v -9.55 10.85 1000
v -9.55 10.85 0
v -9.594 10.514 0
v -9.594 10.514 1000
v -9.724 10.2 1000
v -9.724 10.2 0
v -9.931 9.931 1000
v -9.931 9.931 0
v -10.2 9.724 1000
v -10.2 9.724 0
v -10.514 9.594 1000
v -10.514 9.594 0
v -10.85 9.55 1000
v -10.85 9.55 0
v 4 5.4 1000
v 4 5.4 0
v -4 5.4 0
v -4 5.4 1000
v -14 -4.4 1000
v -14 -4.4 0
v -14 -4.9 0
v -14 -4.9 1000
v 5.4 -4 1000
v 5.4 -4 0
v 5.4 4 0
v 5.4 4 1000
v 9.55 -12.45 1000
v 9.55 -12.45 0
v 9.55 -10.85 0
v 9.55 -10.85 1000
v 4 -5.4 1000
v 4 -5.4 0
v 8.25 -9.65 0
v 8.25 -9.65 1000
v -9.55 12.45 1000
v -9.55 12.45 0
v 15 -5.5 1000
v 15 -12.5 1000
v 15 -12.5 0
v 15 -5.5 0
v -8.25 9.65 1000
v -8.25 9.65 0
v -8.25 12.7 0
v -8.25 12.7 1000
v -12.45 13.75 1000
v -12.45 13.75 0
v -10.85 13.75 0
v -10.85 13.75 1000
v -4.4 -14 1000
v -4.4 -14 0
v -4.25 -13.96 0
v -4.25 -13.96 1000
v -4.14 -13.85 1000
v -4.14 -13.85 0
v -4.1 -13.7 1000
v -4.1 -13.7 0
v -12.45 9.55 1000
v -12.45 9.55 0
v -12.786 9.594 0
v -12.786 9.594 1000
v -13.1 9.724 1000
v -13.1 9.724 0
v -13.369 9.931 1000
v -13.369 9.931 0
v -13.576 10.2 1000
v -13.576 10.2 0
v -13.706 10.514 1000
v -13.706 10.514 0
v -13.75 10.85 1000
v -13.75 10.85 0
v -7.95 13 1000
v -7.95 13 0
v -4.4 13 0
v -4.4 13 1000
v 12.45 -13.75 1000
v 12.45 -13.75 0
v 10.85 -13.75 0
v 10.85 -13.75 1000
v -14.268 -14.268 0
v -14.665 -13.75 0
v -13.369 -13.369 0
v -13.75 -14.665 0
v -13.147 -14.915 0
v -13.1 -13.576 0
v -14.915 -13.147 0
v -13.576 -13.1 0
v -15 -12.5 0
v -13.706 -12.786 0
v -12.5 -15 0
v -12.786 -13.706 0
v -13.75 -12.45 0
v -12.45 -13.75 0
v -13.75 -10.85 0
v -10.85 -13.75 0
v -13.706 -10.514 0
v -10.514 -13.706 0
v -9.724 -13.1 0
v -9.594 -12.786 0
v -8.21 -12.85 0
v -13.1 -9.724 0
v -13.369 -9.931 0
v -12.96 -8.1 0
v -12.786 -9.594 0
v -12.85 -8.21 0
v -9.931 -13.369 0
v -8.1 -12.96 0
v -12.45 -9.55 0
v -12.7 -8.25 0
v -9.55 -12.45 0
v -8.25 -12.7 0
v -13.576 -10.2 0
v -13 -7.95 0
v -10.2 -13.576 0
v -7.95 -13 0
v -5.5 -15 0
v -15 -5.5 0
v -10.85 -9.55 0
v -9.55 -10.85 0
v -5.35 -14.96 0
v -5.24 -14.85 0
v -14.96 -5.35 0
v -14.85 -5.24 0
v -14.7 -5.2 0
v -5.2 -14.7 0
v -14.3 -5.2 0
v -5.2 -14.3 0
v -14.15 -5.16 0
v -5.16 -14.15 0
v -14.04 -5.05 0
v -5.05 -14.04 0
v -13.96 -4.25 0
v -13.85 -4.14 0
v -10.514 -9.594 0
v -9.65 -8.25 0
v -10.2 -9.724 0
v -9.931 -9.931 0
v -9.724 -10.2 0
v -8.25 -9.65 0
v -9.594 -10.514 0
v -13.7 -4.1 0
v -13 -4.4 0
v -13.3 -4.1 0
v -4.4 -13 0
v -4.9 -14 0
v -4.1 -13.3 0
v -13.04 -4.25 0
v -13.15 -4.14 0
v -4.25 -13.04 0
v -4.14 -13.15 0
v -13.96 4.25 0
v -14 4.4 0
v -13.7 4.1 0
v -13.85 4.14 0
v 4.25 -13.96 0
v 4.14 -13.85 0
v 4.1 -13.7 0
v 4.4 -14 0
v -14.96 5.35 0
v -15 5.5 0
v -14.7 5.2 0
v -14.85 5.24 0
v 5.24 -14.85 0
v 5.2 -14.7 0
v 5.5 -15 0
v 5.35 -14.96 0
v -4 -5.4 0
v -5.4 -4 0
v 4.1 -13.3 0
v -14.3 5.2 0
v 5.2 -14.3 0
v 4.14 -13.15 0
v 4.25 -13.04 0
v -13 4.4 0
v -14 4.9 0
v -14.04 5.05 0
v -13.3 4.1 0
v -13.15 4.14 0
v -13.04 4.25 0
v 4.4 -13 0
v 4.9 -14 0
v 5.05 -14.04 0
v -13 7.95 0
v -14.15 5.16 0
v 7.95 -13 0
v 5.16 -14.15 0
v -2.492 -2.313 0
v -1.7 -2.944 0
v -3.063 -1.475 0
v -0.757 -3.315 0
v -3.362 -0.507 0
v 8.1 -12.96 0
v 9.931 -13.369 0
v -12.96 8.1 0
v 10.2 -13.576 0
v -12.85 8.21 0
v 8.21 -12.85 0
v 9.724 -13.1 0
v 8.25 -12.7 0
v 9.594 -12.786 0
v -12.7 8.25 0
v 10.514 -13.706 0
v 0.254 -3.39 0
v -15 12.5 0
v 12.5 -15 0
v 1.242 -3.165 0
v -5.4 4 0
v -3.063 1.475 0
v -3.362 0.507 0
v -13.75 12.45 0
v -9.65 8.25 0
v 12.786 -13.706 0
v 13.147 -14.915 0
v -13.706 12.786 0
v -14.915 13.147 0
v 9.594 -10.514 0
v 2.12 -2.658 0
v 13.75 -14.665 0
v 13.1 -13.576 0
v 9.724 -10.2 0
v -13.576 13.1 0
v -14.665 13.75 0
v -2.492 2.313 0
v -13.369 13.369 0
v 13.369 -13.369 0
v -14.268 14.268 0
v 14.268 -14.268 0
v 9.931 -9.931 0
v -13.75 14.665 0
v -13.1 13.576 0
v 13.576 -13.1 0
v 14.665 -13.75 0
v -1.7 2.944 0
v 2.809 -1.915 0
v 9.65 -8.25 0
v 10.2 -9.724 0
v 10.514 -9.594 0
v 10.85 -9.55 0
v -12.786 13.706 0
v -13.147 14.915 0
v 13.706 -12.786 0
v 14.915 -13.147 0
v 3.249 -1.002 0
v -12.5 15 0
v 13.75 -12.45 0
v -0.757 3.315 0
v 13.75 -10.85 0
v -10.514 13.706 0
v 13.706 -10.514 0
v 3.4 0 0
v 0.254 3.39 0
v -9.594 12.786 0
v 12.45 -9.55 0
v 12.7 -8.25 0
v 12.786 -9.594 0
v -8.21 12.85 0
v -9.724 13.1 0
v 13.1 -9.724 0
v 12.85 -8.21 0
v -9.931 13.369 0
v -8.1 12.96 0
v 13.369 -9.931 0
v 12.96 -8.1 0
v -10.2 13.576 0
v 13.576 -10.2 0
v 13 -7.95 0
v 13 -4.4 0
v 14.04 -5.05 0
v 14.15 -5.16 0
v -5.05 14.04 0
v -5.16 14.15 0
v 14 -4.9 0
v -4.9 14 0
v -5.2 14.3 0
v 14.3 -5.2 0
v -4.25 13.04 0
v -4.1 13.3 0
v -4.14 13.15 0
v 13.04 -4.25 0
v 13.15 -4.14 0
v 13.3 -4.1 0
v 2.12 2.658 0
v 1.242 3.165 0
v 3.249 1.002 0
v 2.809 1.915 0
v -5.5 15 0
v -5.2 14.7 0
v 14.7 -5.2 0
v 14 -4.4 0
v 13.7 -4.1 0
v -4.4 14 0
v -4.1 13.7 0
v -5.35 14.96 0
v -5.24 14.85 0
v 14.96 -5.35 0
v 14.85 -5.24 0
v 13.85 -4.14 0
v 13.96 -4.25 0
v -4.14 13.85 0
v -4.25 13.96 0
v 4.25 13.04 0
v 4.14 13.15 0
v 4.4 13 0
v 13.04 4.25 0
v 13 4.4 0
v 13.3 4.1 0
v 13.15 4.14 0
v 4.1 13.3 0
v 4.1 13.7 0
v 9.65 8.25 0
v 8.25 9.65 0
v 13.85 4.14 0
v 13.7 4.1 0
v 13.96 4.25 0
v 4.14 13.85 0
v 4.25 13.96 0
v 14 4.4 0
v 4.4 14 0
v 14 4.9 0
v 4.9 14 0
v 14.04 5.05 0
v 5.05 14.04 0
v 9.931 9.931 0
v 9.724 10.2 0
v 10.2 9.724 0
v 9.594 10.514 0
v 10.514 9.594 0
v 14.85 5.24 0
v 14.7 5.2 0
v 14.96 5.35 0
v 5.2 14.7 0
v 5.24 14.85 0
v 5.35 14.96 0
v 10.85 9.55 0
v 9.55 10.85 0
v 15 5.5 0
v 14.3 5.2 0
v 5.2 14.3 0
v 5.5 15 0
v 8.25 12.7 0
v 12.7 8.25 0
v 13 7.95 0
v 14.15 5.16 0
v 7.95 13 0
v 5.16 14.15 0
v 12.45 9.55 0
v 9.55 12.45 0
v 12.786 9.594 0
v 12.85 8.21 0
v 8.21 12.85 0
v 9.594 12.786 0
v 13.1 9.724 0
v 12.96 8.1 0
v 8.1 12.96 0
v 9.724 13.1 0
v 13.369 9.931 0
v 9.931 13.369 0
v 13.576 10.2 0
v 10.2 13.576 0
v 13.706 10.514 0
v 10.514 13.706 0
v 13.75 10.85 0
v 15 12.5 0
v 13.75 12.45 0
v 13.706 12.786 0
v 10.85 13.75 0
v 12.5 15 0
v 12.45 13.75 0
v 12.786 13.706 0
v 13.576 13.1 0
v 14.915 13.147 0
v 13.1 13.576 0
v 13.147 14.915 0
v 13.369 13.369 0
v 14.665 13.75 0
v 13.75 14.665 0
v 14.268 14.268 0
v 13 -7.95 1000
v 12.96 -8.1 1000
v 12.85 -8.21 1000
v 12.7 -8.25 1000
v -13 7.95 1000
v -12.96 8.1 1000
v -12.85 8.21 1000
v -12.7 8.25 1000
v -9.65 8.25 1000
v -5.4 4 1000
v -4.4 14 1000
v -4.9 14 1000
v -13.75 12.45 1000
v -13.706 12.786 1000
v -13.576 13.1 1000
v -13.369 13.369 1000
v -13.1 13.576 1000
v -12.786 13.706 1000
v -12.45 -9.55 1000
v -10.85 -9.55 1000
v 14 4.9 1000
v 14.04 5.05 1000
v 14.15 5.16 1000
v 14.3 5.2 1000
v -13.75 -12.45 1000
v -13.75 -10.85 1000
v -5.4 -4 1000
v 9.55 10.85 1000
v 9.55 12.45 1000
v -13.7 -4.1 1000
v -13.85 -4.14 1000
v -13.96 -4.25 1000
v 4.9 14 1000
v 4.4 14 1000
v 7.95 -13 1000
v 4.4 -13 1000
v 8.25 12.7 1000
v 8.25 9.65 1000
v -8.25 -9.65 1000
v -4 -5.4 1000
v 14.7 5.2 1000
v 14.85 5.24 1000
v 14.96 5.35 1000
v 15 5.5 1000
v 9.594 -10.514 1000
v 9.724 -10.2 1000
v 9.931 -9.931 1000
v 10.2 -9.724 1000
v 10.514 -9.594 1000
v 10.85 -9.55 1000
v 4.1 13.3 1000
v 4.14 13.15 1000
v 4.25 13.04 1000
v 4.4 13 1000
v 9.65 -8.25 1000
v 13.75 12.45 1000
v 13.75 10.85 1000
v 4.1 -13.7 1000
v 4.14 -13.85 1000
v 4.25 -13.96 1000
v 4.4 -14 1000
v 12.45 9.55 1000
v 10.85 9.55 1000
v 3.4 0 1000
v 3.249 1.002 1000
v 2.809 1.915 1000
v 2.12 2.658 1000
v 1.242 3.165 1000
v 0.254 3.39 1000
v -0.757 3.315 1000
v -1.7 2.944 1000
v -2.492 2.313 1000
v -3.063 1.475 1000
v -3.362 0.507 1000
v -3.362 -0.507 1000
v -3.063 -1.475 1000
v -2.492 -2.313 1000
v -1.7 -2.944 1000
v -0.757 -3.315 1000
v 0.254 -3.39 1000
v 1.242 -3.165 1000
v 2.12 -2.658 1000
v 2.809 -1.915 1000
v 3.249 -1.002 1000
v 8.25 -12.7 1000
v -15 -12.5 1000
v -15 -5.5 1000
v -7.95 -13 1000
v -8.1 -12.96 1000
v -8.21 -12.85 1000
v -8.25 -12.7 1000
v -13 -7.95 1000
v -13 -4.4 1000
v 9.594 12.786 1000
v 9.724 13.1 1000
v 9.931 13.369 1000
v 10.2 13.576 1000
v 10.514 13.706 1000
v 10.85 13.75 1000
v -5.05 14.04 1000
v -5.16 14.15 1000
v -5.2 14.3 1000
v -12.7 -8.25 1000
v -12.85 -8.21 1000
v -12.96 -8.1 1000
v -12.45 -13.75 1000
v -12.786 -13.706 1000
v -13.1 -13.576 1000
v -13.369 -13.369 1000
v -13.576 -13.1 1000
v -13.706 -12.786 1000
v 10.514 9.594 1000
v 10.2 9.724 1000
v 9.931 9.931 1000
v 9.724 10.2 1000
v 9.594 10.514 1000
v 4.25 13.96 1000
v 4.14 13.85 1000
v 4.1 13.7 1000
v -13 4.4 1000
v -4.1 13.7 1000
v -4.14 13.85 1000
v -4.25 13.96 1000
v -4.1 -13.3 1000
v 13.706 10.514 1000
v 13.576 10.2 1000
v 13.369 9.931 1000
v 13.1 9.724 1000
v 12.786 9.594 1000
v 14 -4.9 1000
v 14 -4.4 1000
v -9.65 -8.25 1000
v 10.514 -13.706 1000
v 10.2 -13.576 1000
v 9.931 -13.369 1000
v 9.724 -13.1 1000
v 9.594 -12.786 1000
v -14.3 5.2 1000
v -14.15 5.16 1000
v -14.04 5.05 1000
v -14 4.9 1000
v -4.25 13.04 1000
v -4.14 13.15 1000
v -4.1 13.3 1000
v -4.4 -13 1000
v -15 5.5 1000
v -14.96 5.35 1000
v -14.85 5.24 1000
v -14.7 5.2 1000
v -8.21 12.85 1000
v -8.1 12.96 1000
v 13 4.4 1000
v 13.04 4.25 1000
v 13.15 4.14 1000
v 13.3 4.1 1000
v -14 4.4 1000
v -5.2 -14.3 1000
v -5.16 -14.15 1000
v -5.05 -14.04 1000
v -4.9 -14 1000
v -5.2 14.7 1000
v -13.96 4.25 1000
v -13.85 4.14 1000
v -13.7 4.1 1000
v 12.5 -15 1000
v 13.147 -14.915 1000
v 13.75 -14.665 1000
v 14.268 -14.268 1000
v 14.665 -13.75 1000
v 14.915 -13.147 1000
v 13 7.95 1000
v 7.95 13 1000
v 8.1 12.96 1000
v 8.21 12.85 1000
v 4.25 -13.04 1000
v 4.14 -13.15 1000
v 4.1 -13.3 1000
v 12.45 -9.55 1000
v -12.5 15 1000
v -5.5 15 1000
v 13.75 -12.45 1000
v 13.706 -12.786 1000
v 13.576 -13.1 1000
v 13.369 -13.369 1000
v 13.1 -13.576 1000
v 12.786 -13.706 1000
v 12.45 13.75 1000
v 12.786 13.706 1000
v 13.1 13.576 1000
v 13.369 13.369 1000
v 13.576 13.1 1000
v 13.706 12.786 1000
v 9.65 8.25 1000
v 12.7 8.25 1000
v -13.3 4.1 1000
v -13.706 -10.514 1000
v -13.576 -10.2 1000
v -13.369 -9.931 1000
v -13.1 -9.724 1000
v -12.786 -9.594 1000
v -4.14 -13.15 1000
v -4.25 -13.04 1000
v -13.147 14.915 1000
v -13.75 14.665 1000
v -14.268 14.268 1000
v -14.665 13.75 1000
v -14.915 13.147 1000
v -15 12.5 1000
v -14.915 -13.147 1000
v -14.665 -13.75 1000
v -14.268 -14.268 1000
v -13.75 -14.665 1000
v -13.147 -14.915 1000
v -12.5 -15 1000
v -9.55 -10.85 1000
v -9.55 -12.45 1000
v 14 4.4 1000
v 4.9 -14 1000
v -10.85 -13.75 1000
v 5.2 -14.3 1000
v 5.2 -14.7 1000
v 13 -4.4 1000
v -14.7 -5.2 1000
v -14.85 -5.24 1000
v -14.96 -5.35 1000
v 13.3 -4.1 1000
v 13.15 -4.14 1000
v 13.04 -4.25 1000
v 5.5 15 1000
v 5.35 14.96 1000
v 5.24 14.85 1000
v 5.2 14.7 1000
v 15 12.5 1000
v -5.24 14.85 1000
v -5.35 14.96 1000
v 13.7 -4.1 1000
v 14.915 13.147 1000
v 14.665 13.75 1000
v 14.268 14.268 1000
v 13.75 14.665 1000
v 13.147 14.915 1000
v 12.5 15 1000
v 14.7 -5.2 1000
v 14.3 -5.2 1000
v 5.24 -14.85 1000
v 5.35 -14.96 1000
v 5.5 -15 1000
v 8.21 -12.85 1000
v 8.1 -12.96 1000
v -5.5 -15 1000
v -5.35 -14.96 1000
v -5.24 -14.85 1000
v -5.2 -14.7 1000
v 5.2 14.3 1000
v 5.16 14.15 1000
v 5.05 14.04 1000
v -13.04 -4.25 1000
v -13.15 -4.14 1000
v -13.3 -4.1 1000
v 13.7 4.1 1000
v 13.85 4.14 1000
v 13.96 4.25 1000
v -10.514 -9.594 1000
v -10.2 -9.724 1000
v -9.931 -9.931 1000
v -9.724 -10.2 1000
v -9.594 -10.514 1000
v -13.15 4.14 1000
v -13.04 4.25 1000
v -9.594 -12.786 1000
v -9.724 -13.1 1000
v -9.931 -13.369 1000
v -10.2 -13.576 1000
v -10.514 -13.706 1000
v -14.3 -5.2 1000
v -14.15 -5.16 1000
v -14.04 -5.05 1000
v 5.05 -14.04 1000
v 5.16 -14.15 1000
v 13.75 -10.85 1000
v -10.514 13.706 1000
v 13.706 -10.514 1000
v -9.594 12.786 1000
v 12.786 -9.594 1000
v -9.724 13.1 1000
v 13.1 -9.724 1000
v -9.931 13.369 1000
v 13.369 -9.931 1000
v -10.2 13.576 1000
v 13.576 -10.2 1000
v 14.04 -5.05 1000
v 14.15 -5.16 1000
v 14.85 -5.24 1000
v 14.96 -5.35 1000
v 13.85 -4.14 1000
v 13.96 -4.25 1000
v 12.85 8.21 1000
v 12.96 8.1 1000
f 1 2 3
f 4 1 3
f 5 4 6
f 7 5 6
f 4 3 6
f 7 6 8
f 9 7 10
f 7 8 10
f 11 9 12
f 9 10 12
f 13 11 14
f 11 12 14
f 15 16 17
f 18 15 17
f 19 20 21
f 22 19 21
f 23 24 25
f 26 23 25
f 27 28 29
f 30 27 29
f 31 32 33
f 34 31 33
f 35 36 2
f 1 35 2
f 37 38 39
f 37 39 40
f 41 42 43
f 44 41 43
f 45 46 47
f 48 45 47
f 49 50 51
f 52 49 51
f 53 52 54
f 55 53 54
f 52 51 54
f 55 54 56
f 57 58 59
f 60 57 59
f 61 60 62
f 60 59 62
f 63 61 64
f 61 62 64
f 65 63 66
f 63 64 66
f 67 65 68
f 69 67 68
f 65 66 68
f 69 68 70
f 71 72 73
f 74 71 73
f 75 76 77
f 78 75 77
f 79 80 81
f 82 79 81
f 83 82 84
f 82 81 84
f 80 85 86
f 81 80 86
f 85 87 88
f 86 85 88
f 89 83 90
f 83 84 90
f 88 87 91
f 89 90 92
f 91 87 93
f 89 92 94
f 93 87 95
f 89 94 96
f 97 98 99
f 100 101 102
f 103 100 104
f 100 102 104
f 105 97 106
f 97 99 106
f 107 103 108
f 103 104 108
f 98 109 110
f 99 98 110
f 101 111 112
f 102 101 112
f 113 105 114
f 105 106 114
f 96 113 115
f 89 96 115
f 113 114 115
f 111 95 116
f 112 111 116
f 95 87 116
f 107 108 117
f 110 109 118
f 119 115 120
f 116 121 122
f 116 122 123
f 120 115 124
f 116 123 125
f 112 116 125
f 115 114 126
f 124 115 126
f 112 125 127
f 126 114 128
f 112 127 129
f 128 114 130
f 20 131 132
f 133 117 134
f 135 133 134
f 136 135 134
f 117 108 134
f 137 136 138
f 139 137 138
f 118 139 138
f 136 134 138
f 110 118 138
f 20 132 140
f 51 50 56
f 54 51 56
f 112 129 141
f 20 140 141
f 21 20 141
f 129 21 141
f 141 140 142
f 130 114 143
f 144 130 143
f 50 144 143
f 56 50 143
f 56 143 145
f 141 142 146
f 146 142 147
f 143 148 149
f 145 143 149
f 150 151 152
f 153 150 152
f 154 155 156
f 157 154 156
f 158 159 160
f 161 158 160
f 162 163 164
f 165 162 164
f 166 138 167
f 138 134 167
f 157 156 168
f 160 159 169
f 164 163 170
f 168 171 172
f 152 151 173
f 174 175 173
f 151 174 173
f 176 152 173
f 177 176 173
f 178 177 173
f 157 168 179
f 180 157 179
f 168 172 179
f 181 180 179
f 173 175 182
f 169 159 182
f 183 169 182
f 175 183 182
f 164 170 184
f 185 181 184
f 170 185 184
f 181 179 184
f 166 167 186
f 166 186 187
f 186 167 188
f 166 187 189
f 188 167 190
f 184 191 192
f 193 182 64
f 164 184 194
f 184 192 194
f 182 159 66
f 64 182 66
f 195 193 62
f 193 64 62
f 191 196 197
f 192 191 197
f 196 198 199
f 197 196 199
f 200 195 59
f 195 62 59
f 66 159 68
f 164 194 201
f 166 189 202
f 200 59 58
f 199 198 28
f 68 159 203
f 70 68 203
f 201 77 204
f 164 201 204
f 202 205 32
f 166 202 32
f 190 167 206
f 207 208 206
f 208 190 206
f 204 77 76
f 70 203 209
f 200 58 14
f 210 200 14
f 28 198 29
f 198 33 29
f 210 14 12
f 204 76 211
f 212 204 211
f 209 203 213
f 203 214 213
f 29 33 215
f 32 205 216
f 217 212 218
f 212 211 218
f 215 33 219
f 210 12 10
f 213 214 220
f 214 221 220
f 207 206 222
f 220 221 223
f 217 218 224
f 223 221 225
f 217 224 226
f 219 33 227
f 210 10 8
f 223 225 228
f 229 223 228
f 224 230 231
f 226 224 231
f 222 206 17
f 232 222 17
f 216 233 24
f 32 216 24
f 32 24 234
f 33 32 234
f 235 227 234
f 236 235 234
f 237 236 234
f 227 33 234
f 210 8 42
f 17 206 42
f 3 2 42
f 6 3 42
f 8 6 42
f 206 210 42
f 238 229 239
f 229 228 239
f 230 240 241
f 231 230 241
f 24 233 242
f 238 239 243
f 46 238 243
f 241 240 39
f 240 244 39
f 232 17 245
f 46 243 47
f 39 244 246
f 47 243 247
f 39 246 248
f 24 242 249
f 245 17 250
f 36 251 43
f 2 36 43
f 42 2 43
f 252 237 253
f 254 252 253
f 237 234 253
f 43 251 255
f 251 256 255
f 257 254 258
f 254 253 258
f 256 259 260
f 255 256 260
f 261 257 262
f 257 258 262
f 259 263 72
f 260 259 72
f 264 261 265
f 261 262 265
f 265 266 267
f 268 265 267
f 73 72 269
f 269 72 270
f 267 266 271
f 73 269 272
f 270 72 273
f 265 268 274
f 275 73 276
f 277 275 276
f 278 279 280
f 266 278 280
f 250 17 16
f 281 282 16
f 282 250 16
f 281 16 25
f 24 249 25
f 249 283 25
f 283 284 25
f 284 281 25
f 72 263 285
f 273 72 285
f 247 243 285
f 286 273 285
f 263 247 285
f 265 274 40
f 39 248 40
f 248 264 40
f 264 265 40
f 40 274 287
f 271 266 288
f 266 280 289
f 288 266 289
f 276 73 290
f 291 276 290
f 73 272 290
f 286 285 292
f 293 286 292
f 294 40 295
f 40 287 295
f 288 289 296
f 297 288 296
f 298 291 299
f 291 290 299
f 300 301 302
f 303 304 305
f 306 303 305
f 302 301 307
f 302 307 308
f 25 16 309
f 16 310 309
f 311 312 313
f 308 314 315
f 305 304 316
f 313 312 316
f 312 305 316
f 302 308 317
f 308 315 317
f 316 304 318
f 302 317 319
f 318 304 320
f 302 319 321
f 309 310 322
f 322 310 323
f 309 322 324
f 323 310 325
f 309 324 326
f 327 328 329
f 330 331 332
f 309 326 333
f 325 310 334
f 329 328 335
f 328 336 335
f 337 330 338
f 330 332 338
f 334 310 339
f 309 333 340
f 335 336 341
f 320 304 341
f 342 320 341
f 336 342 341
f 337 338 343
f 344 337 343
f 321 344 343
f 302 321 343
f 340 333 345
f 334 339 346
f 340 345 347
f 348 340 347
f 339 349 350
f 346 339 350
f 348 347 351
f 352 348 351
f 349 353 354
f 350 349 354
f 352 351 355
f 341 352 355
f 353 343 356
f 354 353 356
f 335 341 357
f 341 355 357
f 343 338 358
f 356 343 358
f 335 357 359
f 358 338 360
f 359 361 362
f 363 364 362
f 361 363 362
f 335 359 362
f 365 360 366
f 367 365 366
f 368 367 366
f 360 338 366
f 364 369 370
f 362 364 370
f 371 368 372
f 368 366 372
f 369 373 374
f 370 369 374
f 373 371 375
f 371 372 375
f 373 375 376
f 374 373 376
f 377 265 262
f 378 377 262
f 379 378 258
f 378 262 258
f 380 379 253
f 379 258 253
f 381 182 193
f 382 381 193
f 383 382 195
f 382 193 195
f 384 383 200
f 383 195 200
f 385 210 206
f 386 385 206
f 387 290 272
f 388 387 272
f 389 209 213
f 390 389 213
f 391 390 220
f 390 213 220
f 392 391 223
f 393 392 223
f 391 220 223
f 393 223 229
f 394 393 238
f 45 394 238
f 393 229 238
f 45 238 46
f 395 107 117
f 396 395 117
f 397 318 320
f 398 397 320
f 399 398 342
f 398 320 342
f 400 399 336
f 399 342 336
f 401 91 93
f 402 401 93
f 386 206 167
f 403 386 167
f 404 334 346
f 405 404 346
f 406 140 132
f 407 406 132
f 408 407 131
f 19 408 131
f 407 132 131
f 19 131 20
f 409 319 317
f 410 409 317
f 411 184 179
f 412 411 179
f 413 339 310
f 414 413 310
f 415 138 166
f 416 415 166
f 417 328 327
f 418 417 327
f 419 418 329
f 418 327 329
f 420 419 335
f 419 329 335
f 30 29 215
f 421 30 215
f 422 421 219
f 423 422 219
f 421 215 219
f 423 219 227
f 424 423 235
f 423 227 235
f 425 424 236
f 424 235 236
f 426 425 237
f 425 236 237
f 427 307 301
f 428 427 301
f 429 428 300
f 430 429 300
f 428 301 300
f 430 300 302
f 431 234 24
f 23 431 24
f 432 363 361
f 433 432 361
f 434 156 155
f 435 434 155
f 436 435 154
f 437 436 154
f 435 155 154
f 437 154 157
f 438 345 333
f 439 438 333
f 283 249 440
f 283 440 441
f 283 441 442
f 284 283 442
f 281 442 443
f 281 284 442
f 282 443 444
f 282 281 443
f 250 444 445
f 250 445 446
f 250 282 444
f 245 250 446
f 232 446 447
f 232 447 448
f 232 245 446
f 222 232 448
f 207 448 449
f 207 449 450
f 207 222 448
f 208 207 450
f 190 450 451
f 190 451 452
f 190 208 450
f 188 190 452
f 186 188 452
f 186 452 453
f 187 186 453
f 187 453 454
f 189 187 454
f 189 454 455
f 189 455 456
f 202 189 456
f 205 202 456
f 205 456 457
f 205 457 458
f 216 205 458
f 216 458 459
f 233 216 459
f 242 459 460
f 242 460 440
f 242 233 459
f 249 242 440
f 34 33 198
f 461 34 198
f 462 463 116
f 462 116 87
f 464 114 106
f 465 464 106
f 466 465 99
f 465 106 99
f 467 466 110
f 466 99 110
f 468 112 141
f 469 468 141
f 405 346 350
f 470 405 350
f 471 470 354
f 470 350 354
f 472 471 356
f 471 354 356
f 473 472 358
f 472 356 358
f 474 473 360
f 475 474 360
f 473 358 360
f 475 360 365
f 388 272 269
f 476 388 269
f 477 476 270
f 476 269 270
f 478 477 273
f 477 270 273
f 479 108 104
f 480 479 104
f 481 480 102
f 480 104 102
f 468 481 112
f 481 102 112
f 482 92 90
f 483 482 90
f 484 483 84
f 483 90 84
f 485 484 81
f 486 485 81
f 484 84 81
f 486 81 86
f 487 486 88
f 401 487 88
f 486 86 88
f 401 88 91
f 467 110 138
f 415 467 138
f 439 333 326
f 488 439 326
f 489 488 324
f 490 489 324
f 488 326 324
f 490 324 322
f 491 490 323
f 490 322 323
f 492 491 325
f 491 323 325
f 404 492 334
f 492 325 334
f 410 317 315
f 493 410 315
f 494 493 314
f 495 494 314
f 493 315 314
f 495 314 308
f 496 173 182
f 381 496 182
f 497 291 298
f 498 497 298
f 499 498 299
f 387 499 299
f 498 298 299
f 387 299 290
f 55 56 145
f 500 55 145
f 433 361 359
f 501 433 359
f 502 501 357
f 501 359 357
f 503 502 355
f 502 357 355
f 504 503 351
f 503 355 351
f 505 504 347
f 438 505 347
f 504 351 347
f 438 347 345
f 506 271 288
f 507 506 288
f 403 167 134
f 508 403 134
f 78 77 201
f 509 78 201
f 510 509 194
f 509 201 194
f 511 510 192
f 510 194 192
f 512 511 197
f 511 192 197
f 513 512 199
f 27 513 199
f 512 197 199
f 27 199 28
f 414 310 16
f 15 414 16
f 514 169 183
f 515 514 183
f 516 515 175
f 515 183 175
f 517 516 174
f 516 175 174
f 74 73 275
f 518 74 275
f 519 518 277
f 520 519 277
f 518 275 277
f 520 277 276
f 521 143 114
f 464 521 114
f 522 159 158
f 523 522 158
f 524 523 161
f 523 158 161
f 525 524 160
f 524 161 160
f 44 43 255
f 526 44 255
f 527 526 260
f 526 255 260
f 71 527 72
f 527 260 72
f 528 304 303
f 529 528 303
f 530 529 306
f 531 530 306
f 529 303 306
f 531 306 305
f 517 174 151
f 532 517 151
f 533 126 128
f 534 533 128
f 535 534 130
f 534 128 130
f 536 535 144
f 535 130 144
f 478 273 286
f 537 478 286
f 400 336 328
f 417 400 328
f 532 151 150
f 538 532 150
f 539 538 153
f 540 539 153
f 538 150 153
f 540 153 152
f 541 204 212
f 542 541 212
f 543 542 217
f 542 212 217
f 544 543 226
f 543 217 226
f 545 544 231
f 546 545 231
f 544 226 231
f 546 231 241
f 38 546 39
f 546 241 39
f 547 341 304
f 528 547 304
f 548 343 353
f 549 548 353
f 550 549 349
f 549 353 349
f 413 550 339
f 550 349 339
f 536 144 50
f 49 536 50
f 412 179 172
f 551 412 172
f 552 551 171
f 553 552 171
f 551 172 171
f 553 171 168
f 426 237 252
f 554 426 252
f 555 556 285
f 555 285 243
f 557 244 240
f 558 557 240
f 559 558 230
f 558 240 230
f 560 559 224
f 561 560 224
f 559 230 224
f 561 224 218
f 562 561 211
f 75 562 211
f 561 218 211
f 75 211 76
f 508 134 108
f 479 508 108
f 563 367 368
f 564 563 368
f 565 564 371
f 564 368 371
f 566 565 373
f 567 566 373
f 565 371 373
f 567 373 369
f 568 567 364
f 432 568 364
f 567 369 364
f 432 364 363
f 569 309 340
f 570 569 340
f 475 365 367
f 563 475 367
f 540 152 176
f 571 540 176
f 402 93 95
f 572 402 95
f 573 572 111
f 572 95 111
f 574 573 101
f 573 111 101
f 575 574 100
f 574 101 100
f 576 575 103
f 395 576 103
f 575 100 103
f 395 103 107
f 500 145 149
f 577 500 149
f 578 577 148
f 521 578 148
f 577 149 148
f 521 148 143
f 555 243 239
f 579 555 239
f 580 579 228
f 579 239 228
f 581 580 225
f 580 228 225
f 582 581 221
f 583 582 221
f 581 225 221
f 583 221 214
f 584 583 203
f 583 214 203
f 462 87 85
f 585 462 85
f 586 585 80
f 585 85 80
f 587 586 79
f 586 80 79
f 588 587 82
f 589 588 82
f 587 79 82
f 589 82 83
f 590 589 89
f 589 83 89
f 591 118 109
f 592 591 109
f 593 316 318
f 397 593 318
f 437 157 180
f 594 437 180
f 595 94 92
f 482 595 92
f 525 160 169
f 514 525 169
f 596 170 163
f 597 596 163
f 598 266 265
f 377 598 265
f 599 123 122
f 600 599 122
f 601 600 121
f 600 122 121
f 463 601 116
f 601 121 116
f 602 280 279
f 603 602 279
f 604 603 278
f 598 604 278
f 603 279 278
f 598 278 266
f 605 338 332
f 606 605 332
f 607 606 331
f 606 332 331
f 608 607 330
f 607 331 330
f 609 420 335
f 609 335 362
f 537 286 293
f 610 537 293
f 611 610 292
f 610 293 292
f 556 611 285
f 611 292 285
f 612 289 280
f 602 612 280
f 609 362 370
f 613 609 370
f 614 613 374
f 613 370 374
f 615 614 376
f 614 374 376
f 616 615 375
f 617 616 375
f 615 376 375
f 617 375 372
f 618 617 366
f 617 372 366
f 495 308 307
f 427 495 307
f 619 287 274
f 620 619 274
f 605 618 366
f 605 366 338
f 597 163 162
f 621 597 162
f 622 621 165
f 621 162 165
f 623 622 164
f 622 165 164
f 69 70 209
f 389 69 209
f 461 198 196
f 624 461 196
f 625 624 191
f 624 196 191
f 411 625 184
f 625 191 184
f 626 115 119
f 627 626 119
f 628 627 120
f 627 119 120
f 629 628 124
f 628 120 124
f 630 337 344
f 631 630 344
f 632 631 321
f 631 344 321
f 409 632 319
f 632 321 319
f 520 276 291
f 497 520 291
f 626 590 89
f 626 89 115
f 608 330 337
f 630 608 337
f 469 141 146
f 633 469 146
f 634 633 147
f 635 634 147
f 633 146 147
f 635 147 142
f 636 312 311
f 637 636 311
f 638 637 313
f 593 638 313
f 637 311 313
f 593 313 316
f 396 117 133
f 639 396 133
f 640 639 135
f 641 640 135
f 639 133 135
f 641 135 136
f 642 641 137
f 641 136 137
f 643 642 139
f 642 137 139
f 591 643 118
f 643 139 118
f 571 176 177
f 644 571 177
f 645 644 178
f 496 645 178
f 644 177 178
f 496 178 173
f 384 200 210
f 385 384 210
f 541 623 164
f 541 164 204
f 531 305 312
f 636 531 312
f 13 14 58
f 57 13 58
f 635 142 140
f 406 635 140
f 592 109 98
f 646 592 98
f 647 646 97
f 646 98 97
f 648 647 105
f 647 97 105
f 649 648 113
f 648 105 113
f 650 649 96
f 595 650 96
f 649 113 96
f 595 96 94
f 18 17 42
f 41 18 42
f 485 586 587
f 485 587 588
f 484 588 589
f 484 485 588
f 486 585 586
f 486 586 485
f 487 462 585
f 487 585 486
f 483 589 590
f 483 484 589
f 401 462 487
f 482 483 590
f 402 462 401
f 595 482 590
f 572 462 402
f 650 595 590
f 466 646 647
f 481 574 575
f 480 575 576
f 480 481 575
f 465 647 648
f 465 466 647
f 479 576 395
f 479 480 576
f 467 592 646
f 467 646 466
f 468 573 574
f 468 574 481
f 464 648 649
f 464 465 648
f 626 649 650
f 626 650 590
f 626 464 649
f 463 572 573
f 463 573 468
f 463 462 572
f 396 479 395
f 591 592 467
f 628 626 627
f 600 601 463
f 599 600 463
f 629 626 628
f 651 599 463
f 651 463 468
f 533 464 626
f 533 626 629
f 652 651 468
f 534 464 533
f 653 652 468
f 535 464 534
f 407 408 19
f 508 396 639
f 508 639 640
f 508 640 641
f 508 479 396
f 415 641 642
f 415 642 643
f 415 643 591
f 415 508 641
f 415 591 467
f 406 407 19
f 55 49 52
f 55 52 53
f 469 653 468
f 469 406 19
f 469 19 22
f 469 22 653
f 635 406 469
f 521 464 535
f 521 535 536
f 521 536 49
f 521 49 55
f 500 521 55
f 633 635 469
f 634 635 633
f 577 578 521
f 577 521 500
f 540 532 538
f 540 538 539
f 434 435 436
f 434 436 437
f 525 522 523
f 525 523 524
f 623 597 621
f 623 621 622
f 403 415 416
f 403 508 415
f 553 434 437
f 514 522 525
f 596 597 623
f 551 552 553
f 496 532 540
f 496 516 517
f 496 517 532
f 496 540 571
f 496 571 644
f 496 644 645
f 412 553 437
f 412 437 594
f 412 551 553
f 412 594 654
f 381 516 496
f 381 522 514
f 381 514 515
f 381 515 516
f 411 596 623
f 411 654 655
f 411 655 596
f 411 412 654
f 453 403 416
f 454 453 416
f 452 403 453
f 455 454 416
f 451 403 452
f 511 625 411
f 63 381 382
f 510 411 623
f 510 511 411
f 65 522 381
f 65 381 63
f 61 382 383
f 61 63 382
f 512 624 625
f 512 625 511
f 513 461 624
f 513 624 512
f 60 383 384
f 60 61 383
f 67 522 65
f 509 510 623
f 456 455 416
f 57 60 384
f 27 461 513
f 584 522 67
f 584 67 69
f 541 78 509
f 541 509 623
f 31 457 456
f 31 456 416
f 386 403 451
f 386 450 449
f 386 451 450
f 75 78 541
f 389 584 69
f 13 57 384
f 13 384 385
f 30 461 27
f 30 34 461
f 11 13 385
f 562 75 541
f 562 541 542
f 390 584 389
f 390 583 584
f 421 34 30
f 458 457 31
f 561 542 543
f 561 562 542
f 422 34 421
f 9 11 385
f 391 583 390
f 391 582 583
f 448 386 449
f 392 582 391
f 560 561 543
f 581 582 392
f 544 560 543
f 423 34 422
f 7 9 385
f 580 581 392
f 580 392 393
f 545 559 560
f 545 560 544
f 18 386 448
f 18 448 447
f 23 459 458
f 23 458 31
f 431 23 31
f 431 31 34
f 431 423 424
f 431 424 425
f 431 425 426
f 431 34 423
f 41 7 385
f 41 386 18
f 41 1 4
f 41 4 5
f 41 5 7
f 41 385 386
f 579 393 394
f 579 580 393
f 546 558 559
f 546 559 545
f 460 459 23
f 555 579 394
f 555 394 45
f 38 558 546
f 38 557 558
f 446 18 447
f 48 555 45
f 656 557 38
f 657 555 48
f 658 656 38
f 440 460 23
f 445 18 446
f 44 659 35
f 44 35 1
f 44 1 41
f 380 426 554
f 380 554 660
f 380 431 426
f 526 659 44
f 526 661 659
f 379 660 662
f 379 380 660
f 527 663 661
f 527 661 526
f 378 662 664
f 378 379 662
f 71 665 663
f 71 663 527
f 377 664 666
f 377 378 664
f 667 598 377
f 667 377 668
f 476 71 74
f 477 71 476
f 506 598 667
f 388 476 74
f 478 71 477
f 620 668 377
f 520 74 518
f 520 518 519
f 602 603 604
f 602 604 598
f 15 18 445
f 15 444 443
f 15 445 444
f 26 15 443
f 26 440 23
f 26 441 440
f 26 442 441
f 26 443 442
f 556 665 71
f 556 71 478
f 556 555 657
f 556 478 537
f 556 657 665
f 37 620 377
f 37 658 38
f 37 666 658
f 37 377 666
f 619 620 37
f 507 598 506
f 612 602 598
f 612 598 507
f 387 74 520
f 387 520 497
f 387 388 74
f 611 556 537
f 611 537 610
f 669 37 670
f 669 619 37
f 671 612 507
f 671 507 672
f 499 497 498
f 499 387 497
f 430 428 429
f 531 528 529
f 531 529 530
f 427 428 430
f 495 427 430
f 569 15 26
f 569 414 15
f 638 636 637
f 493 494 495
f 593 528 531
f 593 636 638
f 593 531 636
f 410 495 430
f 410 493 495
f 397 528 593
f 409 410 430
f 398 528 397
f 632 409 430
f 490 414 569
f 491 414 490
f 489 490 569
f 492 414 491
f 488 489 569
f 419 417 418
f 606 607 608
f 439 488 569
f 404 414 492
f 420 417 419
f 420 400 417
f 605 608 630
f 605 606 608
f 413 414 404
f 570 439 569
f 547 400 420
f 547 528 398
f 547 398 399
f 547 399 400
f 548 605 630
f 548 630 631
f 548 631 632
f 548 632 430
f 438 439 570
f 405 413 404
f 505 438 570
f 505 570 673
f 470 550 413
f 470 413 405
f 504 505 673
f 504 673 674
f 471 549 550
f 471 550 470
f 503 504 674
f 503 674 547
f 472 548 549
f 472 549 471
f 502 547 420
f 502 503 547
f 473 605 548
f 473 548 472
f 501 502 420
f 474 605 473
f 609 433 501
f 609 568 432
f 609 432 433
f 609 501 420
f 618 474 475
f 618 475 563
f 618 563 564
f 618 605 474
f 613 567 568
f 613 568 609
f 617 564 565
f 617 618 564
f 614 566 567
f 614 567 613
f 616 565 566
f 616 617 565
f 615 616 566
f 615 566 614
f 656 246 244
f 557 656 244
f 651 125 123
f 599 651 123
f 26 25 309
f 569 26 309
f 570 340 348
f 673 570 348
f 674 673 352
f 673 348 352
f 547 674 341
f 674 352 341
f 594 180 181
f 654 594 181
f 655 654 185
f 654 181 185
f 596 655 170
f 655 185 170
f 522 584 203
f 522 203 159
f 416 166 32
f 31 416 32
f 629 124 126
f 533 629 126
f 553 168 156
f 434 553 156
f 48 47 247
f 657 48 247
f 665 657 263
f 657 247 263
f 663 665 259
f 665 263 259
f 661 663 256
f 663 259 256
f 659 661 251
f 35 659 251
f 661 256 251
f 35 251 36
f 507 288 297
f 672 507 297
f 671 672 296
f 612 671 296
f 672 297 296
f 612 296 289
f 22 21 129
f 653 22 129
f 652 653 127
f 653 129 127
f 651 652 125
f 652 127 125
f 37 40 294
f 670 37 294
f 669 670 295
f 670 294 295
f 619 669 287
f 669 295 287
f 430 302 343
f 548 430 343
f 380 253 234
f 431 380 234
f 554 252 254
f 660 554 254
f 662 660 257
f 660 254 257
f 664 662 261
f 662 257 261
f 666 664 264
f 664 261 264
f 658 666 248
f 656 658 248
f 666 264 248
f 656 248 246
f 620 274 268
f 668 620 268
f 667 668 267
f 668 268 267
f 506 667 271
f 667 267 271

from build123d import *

# Parameters (mm, degrees)
SKETCH_1_R      = 3.4
EXTRUDE_1_DEPTH = 1000


with BuildPart() as part:
    # Эскиз1 → Бобышка-Вытянуть1 (new body)
    with BuildSketch(Plane.XY):
        with BuildLine():
            Line((-15, -8.25), (-15, -12.5))
            ThreePointArc((-15, -12.5), (-14.267766953, -14.267766953), (-12.5, -15))
            Line((-12.5, -15), (-8.25, -15))
            Line((-8.25, -15), (-5.5, -15))
            ThreePointArc((-5.5, -15), (-5.287867966, -14.912132034), (-5.2, -14.7))
            Line((-5.2, -14.7), (-5.2, -14.3))
            ThreePointArc((-5.2, -14.3), (-5.112132034, -14.087867966), (-4.9, -14))
            Line((-4.9, -14), (-4.4, -14))
            ThreePointArc((-4.4, -14), (-4.187867966, -13.912132034), (-4.1, -13.7))
            Line((-4.1, -13.7), (-4.1, -13.3))
            ThreePointArc((-4.1, -13.3), (-4.187867966, -13.087867966), (-4.4, -13))
            Line((-4.4, -13), (-7.95, -13))
            ThreePointArc((-7.95, -13), (-8.162132034, -12.912132034), (-8.25, -12.7))
            Line((-8.25, -12.7), (-8.25, -9.65))
            Line((-8.25, -9.65), (-4, -5.4))
            Line((-4, -5.4), (4, -5.4))
            Line((4, -5.4), (8.25, -9.65))
            Line((8.25, -9.65), (8.25, -12.7))
            ThreePointArc((8.25, -12.7), (8.162132034, -12.912132034), (7.95, -13))
            Line((7.95, -13), (4.4, -13))
            ThreePointArc((4.4, -13), (4.187867966, -13.087867966), (4.1, -13.3))
            Line((4.1, -13.3), (4.1, -13.7))
            ThreePointArc((4.1, -13.7), (4.187867966, -13.912132034), (4.4, -14))
            Line((4.4, -14), (4.9, -14))
            ThreePointArc((4.9, -14), (5.112132034, -14.087867966), (5.2, -14.3))
            Line((5.2, -14.3), (5.2, -14.7))
            ThreePointArc((5.2, -14.7), (5.287867966, -14.912132034), (5.5, -15))
            Line((5.5, -15), (8.25, -15))
            Line((8.25, -15), (12.5, -15))
            ThreePointArc((12.5, -15), (14.267766953, -14.267766953), (15, -12.5))
            Line((15, -12.5), (15, -8.25))
            Line((15, -8.25), (15, -5.5))
            ThreePointArc((15, -5.5), (14.912132034, -5.287867966), (14.7, -5.2))
            Line((14.7, -5.2), (14.3, -5.2))
            ThreePointArc((14.3, -5.2), (14.087867966, -5.112132034), (14, -4.9))
            Line((14, -4.9), (14, -4.4))
            ThreePointArc((14, -4.4), (13.912132034, -4.187867966), (13.7, -4.1))
            Line((13.7, -4.1), (13.3, -4.1))
            ThreePointArc((13.3, -4.1), (13.087867966, -4.187867966), (13, -4.4))
            Line((13, -4.4), (13, -7.95))
            ThreePointArc((13, -7.95), (12.912132034, -8.162132034), (12.7, -8.25))
            Line((12.7, -8.25), (9.65, -8.25))
            Line((9.65, -8.25), (5.4, -4))
            Line((5.4, -4), (5.4, 4))
            Line((5.4, 4), (9.65, 8.25))
            Line((9.65, 8.25), (12.7, 8.25))
            ThreePointArc((12.7, 8.25), (12.912132034, 8.162132034), (13, 7.95))
            Line((13, 7.95), (13, 4.4))
            ThreePointArc((13, 4.4), (13.087867966, 4.187867966), (13.3, 4.1))
            Line((13.3, 4.1), (13.7, 4.1))
            ThreePointArc((13.7, 4.1), (13.912132034, 4.187867966), (14, 4.4))
            Line((14, 4.4), (14, 4.9))
            ThreePointArc((14, 4.9), (14.087867966, 5.112132034), (14.3, 5.2))
            Line((14.3, 5.2), (14.7, 5.2))
            ThreePointArc((14.7, 5.2), (14.912132034, 5.287867966), (15, 5.5))
            Line((15, 5.5), (15, 8.25))
            Line((15, 8.25), (15, 12.5))
            ThreePointArc((15, 12.5), (14.267766953, 14.267766953), (12.5, 15))
            Line((12.5, 15), (8.25, 15))
            Line((8.25, 15), (5.5, 15))
            ThreePointArc((5.5, 15), (5.287867966, 14.912132034), (5.2, 14.7))
            Line((5.2, 14.7), (5.2, 14.3))
            ThreePointArc((5.2, 14.3), (5.112132034, 14.087867966), (4.9, 14))
            Line((4.9, 14), (4.4, 14))
            ThreePointArc((4.4, 14), (4.187867966, 13.912132034), (4.1, 13.7))
            Line((4.1, 13.7), (4.1, 13.3))
            ThreePointArc((4.1, 13.3), (4.187867966, 13.087867966), (4.4, 13))
            Line((4.4, 13), (7.95, 13))
            ThreePointArc((7.95, 13), (8.162132034, 12.912132034), (8.25, 12.7))
            Line((8.25, 12.7), (8.25, 9.65))
            Line((8.25, 9.65), (4, 5.4))
            Line((4, 5.4), (-4, 5.4))
            Line((-4, 5.4), (-8.25, 9.65))
            Line((-8.25, 9.65), (-8.25, 12.7))
            ThreePointArc((-8.25, 12.7), (-8.162132034, 12.912132034), (-7.95, 13))
            Line((-7.95, 13), (-4.4, 13))
            ThreePointArc((-4.4, 13), (-4.187867966, 13.087867966), (-4.1, 13.3))
            Line((-4.1, 13.3), (-4.1, 13.7))
            ThreePointArc((-4.1, 13.7), (-4.187867966, 13.912132034), (-4.4, 14))
            Line((-4.4, 14), (-4.9, 14))
            ThreePointArc((-4.9, 14), (-5.112132034, 14.087867966), (-5.2, 14.3))
            Line((-5.2, 14.3), (-5.2, 14.7))
            ThreePointArc((-5.2, 14.7), (-5.287867966, 14.912132034), (-5.5, 15))
            Line((-5.5, 15), (-8.25, 15))
            Line((-8.25, 15), (-12.5, 15))
            ThreePointArc((-12.5, 15), (-14.267766953, 14.267766953), (-15, 12.5))
            Line((-15, 12.5), (-15, 8.25))
            Line((-15, 8.25), (-15, 5.5))
            ThreePointArc((-15, 5.5), (-14.912132034, 5.287867966), (-14.7, 5.2))
            Line((-14.7, 5.2), (-14.3, 5.2))
            ThreePointArc((-14.3, 5.2), (-14.087867966, 5.112132034), (-14, 4.9))
            Line((-14, 4.9), (-14, 4.4))
            ThreePointArc((-14, 4.4), (-13.912132034, 4.187867966), (-13.7, 4.1))
            Line((-13.7, 4.1), (-13.3, 4.1))
            ThreePointArc((-13.3, 4.1), (-13.087867966, 4.187867966), (-13, 4.4))
            Line((-13, 4.4), (-13, 7.95))
            ThreePointArc((-13, 7.95), (-12.912132034, 8.162132034), (-12.7, 8.25))
            Line((-12.7, 8.25), (-9.65, 8.25))
            Line((-9.65, 8.25), (-5.4, 4))
            Line((-5.4, 4), (-5.4, -4))
            Line((-5.4, -4), (-9.65, -8.25))
            Line((-9.65, -8.25), (-12.7, -8.25))
            ThreePointArc((-12.7, -8.25), (-12.912132034, -8.162132034), (-13, -7.95))
            Line((-13, -7.95), (-13, -4.4))
            ThreePointArc((-13, -4.4), (-13.087867966, -4.187867966), (-13.3, -4.1))
            Line((-13.3, -4.1), (-13.7, -4.1))
            ThreePointArc((-13.7, -4.1), (-13.912132034, -4.187867966), (-14, -4.4))
            Line((-14, -4.4), (-14, -4.9))
            ThreePointArc((-14, -4.9), (-14.087867966, -5.112132034), (-14.3, -5.2))
            Line((-14.3, -5.2), (-14.7, -5.2))
            ThreePointArc((-14.7, -5.2), (-14.912132034, -5.287867966), (-15, -5.5))
            Line((-15, -5.5), (-15, -8.25))
        make_face()
        Circle(SKETCH_1_R, mode=Mode.SUBTRACT)
        with BuildLine():
            Line((-12.45, -9.55), (-10.85, -9.55))
            ThreePointArc((-10.85, -9.55), (-9.930761184, -9.930761184), (-9.55, -10.85))
            Line((-9.55, -10.85), (-9.55, -12.45))
            ThreePointArc((-9.55, -12.45), (-9.930761184, -13.369238816), (-10.85, -13.75))
            Line((-10.85, -13.75), (-12.45, -13.75))
            ThreePointArc((-12.45, -13.75), (-13.369238816, -13.369238816), (-13.75, -12.45))
            Line((-13.75, -12.45), (-13.75, -10.85))
            ThreePointArc((-13.75, -10.85), (-13.369238816, -9.930761184), (-12.45, -9.55))
        make_face(mode=Mode.SUBTRACT)
        with BuildLine():
            Line((-9.55, 12.45), (-9.55, 10.85))
            ThreePointArc((-9.55, 10.85), (-9.930761184, 9.930761184), (-10.85, 9.55))
            Line((-10.85, 9.55), (-12.45, 9.55))
            ThreePointArc((-12.45, 9.55), (-13.369238816, 9.930761184), (-13.75, 10.85))
            Line((-13.75, 10.85), (-13.75, 12.45))
            ThreePointArc((-13.75, 12.45), (-13.369238816, 13.369238816), (-12.45, 13.75))
            Line((-12.45, 13.75), (-10.85, 13.75))
            ThreePointArc((-10.85, 13.75), (-9.930761184, 13.369238816), (-9.55, 12.45))
        make_face(mode=Mode.SUBTRACT)
        with BuildLine():
            Line((12.45, 9.55), (10.85, 9.55))
            ThreePointArc((10.85, 9.55), (9.930761184, 9.930761184), (9.55, 10.85))
            Line((9.55, 10.85), (9.55, 12.45))
            ThreePointArc((9.55, 12.45), (9.930761184, 13.369238816), (10.85, 13.75))
            Line((10.85, 13.75), (12.45, 13.75))
            ThreePointArc((12.45, 13.75), (13.369238816, 13.369238816), (13.75, 12.45))
            Line((13.75, 12.45), (13.75, 10.85))
            ThreePointArc((13.75, 10.85), (13.369238816, 9.930761184), (12.45, 9.55))
        make_face(mode=Mode.SUBTRACT)
        with BuildLine():
            Line((9.55, -12.45), (9.55, -10.85))
            ThreePointArc((9.55, -10.85), (9.930761184, -9.930761184), (10.85, -9.55))
            Line((10.85, -9.55), (12.45, -9.55))
            ThreePointArc((12.45, -9.55), (13.369238816, -9.930761184), (13.75, -10.85))
            Line((13.75, -10.85), (13.75, -12.45))
            ThreePointArc((13.75, -12.45), (13.369238816, -13.369238816), (12.45, -13.75))
            Line((12.45, -13.75), (10.85, -13.75))
            ThreePointArc((10.85, -13.75), (9.930761184, -13.369238816), (9.55, -12.45))
        make_face(mode=Mode.SUBTRACT)
    extrude(amount=EXTRUDE_1_DEPTH)


solid = part.part
